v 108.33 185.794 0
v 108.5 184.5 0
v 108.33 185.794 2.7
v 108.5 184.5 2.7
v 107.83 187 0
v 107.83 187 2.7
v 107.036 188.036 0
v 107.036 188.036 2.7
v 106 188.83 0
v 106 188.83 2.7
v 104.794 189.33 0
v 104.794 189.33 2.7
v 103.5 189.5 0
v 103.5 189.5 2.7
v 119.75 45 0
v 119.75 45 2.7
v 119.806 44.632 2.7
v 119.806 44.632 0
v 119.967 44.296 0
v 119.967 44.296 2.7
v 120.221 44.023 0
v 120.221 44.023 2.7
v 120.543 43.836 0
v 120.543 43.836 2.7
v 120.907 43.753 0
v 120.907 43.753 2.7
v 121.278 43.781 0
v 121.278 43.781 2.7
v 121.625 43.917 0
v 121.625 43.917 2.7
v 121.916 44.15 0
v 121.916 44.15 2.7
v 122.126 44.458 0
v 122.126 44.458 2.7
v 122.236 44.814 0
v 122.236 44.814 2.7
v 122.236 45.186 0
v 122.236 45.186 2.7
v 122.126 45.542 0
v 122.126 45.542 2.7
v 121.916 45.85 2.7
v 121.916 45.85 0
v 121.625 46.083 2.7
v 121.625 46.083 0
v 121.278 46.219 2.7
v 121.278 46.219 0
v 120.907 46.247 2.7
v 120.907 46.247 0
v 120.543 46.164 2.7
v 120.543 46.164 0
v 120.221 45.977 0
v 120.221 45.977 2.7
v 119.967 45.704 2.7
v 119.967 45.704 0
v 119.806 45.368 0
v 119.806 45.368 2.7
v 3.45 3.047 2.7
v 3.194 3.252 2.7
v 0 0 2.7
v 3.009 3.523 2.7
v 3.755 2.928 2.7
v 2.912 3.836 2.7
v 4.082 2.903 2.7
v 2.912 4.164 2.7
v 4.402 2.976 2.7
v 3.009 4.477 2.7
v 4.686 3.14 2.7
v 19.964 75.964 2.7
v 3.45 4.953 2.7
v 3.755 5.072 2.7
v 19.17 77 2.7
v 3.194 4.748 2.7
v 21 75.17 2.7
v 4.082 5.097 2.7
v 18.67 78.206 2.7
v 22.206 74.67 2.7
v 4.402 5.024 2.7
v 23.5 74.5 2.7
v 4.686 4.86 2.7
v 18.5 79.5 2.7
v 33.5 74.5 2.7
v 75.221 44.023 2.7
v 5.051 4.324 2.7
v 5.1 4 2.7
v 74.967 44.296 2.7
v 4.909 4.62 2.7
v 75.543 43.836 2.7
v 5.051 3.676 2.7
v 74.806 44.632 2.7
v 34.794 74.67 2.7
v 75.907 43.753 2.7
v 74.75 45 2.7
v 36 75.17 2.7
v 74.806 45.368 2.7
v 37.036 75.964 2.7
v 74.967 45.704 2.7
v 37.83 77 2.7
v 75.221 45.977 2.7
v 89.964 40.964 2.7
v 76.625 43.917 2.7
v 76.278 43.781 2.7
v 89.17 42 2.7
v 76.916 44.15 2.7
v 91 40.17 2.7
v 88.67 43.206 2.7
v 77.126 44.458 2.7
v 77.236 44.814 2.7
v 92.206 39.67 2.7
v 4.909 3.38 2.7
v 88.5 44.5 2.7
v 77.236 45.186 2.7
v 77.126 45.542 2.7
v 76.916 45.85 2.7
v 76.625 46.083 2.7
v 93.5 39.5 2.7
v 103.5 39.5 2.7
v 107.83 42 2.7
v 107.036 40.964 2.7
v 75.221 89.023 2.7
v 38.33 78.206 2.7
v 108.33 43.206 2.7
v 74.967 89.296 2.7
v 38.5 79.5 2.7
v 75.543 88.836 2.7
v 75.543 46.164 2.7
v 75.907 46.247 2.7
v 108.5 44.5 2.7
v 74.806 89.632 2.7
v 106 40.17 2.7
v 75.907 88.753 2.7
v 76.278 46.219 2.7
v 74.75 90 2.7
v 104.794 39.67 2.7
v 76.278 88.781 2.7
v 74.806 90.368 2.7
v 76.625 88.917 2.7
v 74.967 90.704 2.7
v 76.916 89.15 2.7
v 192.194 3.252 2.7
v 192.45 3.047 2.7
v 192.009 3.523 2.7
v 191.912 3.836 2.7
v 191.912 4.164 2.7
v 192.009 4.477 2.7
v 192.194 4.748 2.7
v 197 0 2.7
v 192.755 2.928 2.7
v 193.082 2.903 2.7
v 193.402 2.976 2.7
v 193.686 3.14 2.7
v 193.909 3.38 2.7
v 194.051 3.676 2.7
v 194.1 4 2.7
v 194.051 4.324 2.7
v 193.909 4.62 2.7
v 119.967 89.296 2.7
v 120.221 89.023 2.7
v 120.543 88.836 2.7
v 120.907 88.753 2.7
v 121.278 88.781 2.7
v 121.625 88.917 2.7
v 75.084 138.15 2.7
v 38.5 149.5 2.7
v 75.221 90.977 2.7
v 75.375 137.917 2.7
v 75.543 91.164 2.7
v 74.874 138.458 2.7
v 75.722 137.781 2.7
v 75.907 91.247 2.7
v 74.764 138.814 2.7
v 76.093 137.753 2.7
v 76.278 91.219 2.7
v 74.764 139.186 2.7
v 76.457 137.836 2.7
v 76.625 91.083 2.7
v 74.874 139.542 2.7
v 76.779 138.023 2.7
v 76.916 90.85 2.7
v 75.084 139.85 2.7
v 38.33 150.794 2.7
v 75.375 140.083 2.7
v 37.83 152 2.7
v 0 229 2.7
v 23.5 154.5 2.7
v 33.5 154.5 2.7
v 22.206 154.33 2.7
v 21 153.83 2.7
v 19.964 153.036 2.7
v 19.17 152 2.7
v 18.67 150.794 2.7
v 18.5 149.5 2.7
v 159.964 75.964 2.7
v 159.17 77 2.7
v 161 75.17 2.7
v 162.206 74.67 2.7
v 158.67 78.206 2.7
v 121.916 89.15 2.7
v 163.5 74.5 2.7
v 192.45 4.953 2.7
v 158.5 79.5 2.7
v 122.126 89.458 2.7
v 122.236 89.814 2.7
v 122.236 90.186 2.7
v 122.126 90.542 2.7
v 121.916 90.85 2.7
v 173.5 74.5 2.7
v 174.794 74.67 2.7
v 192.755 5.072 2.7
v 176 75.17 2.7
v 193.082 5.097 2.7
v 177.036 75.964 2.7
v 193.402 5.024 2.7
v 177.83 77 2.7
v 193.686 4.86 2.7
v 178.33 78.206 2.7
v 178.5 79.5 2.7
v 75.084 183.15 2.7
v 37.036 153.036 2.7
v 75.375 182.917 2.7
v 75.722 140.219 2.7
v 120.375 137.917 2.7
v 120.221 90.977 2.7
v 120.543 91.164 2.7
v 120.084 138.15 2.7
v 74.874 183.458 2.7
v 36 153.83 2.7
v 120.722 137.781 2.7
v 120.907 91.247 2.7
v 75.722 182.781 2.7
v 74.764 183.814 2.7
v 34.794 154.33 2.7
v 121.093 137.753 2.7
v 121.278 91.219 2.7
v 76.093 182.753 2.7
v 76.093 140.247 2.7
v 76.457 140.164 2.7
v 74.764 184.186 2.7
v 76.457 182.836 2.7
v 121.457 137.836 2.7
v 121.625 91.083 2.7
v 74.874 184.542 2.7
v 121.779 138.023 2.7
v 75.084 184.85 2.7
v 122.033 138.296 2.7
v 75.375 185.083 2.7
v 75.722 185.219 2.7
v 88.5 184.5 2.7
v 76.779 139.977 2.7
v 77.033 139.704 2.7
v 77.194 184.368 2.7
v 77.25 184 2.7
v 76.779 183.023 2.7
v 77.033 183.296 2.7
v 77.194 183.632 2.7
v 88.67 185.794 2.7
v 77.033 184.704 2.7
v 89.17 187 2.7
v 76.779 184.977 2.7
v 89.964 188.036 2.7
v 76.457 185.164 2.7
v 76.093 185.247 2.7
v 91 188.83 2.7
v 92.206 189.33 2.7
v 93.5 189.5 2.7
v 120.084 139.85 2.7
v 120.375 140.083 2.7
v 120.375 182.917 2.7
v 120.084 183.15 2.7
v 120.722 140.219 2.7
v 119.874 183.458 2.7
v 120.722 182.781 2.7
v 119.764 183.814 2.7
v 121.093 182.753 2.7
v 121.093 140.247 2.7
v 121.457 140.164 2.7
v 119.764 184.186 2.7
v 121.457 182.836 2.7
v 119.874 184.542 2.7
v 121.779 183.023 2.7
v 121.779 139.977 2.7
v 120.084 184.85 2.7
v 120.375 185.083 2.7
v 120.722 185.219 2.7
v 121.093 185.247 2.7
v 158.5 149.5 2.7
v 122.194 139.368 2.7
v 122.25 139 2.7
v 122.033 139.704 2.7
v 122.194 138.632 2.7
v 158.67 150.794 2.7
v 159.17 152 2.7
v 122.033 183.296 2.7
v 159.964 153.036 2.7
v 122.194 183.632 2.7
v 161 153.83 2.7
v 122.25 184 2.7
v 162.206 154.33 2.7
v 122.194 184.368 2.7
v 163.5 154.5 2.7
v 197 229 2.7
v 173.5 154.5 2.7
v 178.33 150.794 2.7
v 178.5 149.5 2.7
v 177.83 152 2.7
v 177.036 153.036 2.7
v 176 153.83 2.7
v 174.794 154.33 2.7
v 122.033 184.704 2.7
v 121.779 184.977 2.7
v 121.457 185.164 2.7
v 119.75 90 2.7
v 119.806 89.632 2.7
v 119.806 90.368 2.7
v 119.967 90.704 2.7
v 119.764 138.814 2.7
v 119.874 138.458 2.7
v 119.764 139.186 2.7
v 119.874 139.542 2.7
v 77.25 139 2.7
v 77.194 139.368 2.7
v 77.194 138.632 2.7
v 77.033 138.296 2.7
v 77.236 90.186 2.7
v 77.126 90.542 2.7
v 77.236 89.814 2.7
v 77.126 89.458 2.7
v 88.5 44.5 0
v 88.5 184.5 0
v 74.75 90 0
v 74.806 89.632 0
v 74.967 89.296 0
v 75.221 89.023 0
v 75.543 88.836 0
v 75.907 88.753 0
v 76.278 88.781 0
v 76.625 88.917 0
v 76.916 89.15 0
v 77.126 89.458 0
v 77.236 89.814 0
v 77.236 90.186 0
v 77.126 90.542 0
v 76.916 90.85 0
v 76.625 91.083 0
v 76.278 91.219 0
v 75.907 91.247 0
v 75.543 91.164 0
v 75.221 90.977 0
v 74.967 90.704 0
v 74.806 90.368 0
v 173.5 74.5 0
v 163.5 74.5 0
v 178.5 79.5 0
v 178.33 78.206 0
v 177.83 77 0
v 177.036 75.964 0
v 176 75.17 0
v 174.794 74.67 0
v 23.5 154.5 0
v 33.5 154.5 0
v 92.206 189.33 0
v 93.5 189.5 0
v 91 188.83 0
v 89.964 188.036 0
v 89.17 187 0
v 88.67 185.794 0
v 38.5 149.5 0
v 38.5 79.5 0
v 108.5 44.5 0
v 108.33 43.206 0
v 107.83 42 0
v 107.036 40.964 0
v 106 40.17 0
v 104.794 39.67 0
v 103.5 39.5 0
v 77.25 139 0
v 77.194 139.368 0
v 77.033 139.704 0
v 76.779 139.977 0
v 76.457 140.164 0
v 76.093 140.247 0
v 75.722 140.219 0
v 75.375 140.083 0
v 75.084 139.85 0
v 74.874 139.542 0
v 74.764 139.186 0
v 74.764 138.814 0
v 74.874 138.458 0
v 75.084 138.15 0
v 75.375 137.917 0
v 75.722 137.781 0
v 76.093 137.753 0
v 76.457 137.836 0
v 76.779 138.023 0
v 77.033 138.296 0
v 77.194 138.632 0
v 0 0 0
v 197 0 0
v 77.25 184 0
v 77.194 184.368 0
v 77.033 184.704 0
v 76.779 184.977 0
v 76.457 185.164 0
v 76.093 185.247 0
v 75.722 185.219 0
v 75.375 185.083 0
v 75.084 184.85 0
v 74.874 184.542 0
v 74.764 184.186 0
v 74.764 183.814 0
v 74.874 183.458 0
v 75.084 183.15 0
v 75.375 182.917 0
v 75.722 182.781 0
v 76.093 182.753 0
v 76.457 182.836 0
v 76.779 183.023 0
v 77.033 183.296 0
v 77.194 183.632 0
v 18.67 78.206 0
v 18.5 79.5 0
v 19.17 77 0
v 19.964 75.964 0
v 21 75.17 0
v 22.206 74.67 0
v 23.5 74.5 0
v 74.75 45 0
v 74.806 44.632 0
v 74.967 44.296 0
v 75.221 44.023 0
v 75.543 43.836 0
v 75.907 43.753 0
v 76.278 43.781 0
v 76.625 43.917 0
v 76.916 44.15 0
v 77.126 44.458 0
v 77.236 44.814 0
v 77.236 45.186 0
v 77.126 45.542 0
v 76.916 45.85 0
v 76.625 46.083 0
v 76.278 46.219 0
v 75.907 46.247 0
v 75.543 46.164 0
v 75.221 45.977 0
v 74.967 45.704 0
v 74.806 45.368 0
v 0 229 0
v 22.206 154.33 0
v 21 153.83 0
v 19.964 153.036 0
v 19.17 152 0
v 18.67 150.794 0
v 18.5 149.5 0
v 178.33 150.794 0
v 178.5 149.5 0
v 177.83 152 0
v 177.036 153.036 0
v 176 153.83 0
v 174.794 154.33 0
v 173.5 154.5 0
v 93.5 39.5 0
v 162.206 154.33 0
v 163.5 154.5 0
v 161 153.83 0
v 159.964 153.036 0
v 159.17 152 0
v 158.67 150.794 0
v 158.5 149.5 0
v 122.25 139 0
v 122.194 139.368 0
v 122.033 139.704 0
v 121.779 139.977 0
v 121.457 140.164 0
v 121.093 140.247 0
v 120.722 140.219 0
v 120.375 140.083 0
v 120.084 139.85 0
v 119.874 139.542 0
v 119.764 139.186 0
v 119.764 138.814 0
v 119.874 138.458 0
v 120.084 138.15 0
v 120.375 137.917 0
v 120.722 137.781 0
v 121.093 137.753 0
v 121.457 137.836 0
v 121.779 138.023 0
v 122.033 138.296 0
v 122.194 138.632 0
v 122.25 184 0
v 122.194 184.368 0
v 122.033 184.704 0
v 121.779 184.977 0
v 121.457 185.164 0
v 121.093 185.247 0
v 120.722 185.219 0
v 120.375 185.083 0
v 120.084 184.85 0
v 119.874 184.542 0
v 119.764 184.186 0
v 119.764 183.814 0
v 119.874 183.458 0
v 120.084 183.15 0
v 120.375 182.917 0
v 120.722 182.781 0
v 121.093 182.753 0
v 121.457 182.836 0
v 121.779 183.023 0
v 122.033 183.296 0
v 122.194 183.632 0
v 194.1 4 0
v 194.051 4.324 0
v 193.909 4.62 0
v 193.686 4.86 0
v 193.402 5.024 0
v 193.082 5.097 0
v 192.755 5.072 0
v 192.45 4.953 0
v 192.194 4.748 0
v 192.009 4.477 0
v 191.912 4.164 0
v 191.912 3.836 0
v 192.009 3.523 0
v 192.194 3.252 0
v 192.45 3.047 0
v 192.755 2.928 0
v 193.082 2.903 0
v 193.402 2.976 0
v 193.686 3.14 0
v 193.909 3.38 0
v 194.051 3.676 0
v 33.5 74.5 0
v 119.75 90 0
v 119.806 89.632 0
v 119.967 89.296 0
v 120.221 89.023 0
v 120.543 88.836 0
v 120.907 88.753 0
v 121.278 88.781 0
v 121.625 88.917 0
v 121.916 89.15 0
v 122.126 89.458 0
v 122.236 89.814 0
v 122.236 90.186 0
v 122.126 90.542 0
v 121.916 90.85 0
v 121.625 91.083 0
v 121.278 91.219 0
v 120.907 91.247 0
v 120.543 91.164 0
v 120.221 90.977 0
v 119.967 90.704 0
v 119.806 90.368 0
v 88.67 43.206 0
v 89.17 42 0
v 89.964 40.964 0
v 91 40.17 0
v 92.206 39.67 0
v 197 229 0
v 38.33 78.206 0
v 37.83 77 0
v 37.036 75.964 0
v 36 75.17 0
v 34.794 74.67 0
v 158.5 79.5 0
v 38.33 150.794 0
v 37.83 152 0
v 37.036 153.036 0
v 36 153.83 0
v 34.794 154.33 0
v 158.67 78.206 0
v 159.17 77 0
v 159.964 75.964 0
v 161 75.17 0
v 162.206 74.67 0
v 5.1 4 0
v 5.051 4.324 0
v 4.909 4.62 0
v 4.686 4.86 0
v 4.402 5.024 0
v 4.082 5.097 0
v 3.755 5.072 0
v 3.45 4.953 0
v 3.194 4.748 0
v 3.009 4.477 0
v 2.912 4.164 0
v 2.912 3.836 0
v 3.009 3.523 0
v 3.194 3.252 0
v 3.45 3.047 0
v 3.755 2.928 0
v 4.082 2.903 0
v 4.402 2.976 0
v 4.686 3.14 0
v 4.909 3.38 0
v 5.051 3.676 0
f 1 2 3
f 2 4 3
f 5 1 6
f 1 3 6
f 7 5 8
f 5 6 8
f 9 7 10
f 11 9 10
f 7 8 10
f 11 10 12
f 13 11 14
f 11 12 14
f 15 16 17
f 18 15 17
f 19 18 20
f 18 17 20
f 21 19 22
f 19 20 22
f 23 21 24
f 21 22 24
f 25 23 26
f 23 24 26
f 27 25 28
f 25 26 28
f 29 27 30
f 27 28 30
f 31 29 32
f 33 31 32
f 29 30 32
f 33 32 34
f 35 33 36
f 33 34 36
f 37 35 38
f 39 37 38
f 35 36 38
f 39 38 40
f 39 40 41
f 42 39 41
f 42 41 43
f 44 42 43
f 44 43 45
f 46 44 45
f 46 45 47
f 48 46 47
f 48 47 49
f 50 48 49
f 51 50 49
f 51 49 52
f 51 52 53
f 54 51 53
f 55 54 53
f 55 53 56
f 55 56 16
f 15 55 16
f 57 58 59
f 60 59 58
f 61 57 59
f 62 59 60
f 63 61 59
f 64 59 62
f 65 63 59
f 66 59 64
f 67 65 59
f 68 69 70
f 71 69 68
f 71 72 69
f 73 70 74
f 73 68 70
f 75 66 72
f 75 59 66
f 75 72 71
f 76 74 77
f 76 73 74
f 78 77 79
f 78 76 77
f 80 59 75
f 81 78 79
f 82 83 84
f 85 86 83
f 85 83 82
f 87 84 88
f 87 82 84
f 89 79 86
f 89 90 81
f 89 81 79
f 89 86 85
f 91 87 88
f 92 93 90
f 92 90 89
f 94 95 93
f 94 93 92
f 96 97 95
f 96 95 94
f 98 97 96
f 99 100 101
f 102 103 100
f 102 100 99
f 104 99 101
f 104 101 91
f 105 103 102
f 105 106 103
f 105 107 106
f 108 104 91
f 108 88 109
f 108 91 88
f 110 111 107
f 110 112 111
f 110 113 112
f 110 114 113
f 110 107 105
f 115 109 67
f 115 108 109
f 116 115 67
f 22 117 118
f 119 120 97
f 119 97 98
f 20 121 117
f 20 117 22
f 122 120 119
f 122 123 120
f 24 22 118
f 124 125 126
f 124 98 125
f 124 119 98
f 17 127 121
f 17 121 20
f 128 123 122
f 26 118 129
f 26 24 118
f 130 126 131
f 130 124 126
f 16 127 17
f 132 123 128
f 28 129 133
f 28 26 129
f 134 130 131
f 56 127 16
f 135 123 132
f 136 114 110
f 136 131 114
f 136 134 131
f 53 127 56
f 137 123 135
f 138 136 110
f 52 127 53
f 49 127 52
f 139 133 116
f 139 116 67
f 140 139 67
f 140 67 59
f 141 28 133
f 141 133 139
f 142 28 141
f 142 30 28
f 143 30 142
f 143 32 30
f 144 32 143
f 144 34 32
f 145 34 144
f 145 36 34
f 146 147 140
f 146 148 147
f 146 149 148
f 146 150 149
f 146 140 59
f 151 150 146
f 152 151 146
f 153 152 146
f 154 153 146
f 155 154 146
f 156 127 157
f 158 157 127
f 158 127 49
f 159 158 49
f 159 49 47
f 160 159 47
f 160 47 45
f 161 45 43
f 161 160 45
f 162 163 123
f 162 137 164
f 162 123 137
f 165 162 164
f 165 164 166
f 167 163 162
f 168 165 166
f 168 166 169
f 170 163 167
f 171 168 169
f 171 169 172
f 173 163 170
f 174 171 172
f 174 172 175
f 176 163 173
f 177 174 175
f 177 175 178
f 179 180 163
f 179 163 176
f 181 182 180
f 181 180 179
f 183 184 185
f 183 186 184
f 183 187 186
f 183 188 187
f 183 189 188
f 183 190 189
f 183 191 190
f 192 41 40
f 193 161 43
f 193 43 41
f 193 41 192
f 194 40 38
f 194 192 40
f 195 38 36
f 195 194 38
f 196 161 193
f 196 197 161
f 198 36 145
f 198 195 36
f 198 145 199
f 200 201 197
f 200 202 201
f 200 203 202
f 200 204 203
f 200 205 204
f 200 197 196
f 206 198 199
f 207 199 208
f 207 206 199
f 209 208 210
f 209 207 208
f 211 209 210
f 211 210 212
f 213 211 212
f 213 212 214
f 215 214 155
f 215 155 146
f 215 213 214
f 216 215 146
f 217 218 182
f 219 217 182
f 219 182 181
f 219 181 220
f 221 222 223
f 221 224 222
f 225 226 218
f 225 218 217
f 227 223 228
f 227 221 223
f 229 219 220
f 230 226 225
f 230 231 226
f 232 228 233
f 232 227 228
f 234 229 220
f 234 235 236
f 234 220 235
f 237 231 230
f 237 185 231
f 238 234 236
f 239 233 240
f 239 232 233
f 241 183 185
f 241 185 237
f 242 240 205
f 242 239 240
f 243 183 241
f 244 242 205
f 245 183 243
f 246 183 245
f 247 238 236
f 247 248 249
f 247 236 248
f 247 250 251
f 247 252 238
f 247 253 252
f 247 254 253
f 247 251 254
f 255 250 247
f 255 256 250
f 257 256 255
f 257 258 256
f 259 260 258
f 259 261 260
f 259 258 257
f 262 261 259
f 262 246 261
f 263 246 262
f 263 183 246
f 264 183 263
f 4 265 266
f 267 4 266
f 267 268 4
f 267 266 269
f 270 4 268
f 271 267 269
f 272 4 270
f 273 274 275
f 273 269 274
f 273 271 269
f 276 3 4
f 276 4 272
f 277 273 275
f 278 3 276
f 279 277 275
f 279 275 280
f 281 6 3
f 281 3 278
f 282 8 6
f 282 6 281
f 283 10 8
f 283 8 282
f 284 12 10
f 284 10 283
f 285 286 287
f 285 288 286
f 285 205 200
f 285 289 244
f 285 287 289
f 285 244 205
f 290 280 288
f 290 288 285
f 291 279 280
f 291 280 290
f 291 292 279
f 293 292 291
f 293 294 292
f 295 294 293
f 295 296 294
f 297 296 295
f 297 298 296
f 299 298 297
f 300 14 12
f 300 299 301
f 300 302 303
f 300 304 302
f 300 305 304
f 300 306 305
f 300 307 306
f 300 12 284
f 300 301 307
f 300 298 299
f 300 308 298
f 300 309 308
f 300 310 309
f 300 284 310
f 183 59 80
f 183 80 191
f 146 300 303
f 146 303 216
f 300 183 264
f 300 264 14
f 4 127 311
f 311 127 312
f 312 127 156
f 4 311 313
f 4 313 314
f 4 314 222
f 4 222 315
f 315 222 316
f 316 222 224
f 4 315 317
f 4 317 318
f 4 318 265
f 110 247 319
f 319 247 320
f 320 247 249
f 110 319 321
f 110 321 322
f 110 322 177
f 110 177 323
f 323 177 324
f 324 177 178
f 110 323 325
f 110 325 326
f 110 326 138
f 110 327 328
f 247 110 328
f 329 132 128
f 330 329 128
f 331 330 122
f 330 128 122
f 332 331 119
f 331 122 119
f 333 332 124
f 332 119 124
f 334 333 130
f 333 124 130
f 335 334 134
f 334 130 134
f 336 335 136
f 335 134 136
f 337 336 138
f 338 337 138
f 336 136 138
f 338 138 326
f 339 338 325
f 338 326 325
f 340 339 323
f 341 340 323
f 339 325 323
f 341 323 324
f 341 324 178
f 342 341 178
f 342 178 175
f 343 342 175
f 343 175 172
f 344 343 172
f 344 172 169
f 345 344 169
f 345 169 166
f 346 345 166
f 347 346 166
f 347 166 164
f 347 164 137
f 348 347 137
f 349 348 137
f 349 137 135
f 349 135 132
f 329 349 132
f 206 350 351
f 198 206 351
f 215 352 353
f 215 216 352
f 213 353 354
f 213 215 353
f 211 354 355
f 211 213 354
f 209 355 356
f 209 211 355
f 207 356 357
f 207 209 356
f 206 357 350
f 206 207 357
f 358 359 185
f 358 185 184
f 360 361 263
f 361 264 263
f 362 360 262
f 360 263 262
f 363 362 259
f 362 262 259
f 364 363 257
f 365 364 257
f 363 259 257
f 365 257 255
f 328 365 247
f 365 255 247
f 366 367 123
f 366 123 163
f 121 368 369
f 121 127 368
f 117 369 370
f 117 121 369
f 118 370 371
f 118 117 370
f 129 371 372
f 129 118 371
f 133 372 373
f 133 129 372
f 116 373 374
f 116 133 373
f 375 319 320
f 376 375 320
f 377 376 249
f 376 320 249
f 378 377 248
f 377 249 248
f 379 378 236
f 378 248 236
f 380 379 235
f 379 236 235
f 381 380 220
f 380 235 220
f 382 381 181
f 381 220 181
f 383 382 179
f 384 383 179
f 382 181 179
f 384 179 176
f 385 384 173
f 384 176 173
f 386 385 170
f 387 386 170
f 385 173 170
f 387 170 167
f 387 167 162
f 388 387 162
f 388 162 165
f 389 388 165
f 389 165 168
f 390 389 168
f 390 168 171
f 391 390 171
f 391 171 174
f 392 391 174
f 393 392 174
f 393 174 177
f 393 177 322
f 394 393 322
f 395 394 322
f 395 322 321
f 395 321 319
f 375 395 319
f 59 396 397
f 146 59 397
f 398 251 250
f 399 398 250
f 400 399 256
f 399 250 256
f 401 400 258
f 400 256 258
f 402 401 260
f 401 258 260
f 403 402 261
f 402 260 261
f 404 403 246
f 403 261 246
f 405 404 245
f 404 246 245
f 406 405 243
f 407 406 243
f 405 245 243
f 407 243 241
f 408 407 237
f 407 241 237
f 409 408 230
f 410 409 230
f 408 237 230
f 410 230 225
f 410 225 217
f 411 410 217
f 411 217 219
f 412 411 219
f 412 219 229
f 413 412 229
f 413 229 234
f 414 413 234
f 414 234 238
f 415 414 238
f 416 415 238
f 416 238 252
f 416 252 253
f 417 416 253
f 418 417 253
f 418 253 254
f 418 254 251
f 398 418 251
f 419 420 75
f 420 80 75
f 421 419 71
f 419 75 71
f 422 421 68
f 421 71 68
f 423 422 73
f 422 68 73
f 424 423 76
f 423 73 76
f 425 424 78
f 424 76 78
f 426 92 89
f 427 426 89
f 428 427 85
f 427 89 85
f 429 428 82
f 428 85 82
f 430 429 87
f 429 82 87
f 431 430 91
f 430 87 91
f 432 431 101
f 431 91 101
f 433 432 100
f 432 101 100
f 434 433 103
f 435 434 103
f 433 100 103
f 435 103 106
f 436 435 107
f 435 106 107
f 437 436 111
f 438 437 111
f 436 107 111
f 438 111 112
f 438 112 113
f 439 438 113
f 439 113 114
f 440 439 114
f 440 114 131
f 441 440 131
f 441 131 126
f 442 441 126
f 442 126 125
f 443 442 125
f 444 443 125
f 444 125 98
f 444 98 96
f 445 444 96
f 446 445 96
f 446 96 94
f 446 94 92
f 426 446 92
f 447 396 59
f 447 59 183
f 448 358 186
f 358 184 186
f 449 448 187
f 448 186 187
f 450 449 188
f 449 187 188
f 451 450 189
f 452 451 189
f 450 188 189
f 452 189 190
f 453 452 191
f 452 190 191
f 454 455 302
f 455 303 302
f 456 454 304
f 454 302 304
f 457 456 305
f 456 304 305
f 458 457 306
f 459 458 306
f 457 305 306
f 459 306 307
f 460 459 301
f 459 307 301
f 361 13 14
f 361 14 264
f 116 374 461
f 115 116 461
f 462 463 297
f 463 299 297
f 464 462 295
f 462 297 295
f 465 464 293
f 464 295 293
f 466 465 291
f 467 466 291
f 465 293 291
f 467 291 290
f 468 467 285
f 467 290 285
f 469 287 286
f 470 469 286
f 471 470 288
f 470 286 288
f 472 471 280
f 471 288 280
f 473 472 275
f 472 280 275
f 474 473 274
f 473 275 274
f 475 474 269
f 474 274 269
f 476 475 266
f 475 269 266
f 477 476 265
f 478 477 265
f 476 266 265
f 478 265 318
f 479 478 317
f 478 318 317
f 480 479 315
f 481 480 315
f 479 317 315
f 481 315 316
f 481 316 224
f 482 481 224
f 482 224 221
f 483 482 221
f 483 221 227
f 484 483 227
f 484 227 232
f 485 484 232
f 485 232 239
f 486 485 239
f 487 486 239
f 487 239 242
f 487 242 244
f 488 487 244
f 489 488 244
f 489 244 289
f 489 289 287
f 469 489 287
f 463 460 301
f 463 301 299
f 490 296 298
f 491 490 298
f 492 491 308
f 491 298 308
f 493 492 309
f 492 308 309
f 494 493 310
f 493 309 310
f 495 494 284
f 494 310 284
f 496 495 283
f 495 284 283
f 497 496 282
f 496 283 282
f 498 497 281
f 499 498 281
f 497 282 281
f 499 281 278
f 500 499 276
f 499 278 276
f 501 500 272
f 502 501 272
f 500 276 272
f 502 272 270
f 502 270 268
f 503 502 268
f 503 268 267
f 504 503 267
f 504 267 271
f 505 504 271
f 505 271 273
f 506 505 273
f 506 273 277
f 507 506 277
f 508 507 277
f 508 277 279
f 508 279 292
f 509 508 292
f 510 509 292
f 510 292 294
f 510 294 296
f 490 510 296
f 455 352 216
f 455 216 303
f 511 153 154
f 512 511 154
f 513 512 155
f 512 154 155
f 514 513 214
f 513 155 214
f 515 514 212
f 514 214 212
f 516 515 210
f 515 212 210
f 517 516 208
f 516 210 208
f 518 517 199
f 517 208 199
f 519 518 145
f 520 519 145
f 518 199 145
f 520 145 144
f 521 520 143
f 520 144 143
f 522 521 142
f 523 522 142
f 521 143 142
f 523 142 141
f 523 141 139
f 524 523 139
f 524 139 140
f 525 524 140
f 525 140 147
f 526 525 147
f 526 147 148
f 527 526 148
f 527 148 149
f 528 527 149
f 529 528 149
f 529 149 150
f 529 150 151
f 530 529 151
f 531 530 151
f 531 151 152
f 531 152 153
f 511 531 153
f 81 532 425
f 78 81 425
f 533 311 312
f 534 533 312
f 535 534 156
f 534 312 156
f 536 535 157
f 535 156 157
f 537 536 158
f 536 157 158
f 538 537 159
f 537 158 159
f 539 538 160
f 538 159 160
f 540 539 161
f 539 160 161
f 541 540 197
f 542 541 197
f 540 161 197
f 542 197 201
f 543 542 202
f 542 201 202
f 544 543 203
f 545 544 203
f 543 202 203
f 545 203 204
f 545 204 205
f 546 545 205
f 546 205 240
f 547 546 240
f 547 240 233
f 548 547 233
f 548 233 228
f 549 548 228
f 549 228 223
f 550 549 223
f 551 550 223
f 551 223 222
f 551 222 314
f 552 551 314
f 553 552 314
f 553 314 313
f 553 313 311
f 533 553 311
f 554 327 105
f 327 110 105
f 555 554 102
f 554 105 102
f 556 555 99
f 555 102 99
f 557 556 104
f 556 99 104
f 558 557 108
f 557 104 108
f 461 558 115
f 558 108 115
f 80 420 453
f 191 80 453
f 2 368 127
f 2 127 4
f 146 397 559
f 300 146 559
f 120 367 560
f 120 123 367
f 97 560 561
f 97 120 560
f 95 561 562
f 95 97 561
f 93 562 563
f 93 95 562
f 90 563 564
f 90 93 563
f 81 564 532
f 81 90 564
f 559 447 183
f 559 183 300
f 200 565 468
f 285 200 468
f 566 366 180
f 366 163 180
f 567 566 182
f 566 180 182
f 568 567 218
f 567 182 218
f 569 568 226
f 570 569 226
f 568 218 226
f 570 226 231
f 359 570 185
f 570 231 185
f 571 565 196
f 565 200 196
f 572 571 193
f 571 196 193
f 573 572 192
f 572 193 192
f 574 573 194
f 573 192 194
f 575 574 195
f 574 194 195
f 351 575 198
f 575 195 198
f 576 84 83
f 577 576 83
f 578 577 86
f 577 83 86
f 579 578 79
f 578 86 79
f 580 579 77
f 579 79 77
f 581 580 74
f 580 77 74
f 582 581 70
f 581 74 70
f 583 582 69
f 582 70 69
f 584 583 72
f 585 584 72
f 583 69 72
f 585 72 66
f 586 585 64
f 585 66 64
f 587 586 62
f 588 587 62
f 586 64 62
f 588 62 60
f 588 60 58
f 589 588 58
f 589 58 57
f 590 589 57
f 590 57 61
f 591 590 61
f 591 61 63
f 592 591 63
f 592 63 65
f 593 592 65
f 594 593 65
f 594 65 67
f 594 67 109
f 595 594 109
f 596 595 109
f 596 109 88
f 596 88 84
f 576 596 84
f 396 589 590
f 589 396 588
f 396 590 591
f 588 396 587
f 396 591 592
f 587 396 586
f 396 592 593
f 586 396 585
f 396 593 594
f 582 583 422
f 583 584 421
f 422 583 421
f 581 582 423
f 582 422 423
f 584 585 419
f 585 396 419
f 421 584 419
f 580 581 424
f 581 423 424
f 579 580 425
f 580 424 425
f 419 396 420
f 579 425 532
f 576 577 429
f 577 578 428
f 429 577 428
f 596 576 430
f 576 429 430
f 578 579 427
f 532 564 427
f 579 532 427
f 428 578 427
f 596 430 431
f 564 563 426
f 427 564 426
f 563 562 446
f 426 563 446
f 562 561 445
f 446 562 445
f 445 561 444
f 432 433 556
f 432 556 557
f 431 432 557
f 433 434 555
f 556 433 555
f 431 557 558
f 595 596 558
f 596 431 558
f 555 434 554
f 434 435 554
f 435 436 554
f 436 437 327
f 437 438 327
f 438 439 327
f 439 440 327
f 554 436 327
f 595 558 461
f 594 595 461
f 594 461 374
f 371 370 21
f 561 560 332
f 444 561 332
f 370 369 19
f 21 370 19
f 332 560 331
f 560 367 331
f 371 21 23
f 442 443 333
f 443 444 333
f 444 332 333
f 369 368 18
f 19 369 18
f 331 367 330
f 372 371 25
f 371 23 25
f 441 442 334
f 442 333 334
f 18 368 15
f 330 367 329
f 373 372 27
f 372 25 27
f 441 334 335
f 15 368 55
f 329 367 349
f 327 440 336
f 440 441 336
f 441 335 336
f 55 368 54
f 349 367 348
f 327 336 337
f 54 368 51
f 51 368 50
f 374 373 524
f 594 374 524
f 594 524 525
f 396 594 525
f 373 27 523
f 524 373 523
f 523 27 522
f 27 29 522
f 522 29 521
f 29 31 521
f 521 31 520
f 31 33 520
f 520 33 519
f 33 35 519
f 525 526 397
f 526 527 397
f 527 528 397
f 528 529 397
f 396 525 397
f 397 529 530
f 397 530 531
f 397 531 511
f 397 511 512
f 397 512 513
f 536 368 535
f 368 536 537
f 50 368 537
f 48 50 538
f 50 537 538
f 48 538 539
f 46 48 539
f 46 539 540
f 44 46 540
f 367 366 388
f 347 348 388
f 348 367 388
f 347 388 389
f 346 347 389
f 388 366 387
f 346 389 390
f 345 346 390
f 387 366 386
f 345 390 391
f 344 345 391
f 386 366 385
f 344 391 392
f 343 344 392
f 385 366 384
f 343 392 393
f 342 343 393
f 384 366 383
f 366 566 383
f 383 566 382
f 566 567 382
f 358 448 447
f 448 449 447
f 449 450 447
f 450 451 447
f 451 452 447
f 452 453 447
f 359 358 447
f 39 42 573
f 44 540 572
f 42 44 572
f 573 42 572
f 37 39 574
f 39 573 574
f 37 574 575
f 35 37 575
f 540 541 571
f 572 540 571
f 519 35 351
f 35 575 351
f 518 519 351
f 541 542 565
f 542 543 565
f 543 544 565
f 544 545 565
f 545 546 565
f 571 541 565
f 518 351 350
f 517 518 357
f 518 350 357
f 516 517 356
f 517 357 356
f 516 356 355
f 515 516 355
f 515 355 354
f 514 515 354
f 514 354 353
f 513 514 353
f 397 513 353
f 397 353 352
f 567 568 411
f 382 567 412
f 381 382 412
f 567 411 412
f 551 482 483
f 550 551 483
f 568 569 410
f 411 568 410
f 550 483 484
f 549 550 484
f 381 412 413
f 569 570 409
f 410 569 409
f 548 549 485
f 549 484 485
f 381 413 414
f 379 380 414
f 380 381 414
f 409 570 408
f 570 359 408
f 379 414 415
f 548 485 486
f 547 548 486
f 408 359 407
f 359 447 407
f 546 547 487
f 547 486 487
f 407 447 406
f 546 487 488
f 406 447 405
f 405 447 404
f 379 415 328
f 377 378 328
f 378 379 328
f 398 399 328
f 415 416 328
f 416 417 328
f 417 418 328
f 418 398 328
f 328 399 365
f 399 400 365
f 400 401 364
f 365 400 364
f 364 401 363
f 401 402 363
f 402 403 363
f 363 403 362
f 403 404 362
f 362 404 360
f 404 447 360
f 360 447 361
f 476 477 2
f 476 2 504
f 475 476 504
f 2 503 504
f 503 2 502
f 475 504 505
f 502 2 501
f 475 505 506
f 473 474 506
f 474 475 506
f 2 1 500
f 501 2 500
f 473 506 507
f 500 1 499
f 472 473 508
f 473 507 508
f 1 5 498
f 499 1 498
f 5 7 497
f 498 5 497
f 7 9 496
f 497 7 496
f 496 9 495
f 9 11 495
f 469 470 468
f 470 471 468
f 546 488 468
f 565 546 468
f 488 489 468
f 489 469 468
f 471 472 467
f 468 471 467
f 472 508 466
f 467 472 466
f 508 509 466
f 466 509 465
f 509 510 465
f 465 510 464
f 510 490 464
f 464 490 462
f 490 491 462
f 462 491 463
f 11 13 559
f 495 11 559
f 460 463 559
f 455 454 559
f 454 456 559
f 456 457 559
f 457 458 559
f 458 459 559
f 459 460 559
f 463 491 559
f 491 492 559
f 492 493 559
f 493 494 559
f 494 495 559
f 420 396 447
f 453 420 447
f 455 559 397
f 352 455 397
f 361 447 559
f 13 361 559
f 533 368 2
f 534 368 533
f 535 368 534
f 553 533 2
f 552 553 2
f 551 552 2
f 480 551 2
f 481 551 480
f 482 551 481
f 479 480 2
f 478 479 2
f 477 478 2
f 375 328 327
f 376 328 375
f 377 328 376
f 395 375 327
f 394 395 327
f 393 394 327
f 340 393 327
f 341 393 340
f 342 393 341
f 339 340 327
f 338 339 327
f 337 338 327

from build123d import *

# Parameters (mm, degrees)
SKETCH_1_W          = 197
SKETCH_1_H          = 229
EXTRUDE_1_DEPTH     = 2.7
SKETCH_2_R          = 1.1
CUT_EXTRUDE_1_DEPTH = 2.85
SKETCH_6_W          = 20
SKETCH_6_H          = 80
SKETCH_6_H_2        = 150
CUT_EXTRUDE_4_DEPTH = 10
FILLET_1_R          = 5
SKETCH_7_R          = 1.25
CUT_EXTRUDE_5_DEPTH = 10


with BuildPart() as part:
    # 草图1 → 凸台-拉伸1 (new body)
    with BuildSketch(Plane.XY):
        with Locations((98.5, 114.5)):
            Rectangle(SKETCH_1_W, SKETCH_1_H)
    extrude(amount=EXTRUDE_1_DEPTH)

    # 草图2 → 切除-拉伸1 (cut)
    with BuildSketch(Plane.XY.offset(2.7)):
        with Locations((4, 4)):
            Circle(SKETCH_2_R)
        with Locations((193, 4)):
            Circle(SKETCH_2_R)
    extrude(amount=-CUT_EXTRUDE_1_DEPTH, mode=Mode.SUBTRACT)

    # 草图6 → 切除-拉伸4 (cut)
    with BuildSketch(Plane(origin=(0, 0, 0), x_dir=(-1, 0, 0), z_dir=(0, 0, -1))):
        with Locations((-168.5, 114.5)):
            Rectangle(SKETCH_6_W, SKETCH_6_H)
        with Locations((-28.5, 114.5)):
            Rectangle(SKETCH_6_W, SKETCH_6_H)
        with Locations((-98.5, 114.5)):
            Rectangle(SKETCH_6_W, SKETCH_6_H_2)
    extrude(amount=-CUT_EXTRUDE_4_DEPTH, mode=Mode.SUBTRACT)

    # 圆角1
    fillet_1_edges = [part.edges().sort_by_distance(p)[0] for p in [
        (178.5, 74.5, 1.35),
        (178.5, 154.5, 1.35),
        (158.5, 154.5, 1.35),
        (158.5, 74.5, 1.35),
        (38.5, 74.5, 1.35),
        (38.5, 154.5, 1.35),
        (18.5, 154.5, 1.35),
        (18.5, 74.5, 1.35),
        (108.5, 39.5, 1.35),
        (108.5, 189.5, 1.35),
        (88.5, 189.5, 1.35),
        (88.5, 39.5, 1.35),
    ]]
    fillet(fillet_1_edges, radius=FILLET_1_R)

    # 草图7 → 切除-拉伸5 (cut)
    with BuildSketch(Plane.XY.offset(2.7)):
        with Locations((76, 184)):
            Circle(SKETCH_7_R)
        with Locations((121, 184)):
            Circle(SKETCH_7_R)
        with Locations((76, 139)):
            Circle(SKETCH_7_R)
        with Locations((121, 139)):
            Circle(SKETCH_7_R)
        with Locations(Location((121, 90, 0), (0, 0, 180))):
            Circle(SKETCH_7_R)
        with Locations(Location((76, 90, 0), (0, 0, 180))):
            Circle(SKETCH_7_R)
        with Locations(Location((121, 45, 0), (0, 0, 180))):
            Circle(SKETCH_7_R)
        with Locations(Location((76, 45, 0), (0, 0, 180))):
            Circle(SKETCH_7_R)
    extrude(amount=-CUT_EXTRUDE_5_DEPTH, mode=Mode.SUBTRACT)


solid = part.part
